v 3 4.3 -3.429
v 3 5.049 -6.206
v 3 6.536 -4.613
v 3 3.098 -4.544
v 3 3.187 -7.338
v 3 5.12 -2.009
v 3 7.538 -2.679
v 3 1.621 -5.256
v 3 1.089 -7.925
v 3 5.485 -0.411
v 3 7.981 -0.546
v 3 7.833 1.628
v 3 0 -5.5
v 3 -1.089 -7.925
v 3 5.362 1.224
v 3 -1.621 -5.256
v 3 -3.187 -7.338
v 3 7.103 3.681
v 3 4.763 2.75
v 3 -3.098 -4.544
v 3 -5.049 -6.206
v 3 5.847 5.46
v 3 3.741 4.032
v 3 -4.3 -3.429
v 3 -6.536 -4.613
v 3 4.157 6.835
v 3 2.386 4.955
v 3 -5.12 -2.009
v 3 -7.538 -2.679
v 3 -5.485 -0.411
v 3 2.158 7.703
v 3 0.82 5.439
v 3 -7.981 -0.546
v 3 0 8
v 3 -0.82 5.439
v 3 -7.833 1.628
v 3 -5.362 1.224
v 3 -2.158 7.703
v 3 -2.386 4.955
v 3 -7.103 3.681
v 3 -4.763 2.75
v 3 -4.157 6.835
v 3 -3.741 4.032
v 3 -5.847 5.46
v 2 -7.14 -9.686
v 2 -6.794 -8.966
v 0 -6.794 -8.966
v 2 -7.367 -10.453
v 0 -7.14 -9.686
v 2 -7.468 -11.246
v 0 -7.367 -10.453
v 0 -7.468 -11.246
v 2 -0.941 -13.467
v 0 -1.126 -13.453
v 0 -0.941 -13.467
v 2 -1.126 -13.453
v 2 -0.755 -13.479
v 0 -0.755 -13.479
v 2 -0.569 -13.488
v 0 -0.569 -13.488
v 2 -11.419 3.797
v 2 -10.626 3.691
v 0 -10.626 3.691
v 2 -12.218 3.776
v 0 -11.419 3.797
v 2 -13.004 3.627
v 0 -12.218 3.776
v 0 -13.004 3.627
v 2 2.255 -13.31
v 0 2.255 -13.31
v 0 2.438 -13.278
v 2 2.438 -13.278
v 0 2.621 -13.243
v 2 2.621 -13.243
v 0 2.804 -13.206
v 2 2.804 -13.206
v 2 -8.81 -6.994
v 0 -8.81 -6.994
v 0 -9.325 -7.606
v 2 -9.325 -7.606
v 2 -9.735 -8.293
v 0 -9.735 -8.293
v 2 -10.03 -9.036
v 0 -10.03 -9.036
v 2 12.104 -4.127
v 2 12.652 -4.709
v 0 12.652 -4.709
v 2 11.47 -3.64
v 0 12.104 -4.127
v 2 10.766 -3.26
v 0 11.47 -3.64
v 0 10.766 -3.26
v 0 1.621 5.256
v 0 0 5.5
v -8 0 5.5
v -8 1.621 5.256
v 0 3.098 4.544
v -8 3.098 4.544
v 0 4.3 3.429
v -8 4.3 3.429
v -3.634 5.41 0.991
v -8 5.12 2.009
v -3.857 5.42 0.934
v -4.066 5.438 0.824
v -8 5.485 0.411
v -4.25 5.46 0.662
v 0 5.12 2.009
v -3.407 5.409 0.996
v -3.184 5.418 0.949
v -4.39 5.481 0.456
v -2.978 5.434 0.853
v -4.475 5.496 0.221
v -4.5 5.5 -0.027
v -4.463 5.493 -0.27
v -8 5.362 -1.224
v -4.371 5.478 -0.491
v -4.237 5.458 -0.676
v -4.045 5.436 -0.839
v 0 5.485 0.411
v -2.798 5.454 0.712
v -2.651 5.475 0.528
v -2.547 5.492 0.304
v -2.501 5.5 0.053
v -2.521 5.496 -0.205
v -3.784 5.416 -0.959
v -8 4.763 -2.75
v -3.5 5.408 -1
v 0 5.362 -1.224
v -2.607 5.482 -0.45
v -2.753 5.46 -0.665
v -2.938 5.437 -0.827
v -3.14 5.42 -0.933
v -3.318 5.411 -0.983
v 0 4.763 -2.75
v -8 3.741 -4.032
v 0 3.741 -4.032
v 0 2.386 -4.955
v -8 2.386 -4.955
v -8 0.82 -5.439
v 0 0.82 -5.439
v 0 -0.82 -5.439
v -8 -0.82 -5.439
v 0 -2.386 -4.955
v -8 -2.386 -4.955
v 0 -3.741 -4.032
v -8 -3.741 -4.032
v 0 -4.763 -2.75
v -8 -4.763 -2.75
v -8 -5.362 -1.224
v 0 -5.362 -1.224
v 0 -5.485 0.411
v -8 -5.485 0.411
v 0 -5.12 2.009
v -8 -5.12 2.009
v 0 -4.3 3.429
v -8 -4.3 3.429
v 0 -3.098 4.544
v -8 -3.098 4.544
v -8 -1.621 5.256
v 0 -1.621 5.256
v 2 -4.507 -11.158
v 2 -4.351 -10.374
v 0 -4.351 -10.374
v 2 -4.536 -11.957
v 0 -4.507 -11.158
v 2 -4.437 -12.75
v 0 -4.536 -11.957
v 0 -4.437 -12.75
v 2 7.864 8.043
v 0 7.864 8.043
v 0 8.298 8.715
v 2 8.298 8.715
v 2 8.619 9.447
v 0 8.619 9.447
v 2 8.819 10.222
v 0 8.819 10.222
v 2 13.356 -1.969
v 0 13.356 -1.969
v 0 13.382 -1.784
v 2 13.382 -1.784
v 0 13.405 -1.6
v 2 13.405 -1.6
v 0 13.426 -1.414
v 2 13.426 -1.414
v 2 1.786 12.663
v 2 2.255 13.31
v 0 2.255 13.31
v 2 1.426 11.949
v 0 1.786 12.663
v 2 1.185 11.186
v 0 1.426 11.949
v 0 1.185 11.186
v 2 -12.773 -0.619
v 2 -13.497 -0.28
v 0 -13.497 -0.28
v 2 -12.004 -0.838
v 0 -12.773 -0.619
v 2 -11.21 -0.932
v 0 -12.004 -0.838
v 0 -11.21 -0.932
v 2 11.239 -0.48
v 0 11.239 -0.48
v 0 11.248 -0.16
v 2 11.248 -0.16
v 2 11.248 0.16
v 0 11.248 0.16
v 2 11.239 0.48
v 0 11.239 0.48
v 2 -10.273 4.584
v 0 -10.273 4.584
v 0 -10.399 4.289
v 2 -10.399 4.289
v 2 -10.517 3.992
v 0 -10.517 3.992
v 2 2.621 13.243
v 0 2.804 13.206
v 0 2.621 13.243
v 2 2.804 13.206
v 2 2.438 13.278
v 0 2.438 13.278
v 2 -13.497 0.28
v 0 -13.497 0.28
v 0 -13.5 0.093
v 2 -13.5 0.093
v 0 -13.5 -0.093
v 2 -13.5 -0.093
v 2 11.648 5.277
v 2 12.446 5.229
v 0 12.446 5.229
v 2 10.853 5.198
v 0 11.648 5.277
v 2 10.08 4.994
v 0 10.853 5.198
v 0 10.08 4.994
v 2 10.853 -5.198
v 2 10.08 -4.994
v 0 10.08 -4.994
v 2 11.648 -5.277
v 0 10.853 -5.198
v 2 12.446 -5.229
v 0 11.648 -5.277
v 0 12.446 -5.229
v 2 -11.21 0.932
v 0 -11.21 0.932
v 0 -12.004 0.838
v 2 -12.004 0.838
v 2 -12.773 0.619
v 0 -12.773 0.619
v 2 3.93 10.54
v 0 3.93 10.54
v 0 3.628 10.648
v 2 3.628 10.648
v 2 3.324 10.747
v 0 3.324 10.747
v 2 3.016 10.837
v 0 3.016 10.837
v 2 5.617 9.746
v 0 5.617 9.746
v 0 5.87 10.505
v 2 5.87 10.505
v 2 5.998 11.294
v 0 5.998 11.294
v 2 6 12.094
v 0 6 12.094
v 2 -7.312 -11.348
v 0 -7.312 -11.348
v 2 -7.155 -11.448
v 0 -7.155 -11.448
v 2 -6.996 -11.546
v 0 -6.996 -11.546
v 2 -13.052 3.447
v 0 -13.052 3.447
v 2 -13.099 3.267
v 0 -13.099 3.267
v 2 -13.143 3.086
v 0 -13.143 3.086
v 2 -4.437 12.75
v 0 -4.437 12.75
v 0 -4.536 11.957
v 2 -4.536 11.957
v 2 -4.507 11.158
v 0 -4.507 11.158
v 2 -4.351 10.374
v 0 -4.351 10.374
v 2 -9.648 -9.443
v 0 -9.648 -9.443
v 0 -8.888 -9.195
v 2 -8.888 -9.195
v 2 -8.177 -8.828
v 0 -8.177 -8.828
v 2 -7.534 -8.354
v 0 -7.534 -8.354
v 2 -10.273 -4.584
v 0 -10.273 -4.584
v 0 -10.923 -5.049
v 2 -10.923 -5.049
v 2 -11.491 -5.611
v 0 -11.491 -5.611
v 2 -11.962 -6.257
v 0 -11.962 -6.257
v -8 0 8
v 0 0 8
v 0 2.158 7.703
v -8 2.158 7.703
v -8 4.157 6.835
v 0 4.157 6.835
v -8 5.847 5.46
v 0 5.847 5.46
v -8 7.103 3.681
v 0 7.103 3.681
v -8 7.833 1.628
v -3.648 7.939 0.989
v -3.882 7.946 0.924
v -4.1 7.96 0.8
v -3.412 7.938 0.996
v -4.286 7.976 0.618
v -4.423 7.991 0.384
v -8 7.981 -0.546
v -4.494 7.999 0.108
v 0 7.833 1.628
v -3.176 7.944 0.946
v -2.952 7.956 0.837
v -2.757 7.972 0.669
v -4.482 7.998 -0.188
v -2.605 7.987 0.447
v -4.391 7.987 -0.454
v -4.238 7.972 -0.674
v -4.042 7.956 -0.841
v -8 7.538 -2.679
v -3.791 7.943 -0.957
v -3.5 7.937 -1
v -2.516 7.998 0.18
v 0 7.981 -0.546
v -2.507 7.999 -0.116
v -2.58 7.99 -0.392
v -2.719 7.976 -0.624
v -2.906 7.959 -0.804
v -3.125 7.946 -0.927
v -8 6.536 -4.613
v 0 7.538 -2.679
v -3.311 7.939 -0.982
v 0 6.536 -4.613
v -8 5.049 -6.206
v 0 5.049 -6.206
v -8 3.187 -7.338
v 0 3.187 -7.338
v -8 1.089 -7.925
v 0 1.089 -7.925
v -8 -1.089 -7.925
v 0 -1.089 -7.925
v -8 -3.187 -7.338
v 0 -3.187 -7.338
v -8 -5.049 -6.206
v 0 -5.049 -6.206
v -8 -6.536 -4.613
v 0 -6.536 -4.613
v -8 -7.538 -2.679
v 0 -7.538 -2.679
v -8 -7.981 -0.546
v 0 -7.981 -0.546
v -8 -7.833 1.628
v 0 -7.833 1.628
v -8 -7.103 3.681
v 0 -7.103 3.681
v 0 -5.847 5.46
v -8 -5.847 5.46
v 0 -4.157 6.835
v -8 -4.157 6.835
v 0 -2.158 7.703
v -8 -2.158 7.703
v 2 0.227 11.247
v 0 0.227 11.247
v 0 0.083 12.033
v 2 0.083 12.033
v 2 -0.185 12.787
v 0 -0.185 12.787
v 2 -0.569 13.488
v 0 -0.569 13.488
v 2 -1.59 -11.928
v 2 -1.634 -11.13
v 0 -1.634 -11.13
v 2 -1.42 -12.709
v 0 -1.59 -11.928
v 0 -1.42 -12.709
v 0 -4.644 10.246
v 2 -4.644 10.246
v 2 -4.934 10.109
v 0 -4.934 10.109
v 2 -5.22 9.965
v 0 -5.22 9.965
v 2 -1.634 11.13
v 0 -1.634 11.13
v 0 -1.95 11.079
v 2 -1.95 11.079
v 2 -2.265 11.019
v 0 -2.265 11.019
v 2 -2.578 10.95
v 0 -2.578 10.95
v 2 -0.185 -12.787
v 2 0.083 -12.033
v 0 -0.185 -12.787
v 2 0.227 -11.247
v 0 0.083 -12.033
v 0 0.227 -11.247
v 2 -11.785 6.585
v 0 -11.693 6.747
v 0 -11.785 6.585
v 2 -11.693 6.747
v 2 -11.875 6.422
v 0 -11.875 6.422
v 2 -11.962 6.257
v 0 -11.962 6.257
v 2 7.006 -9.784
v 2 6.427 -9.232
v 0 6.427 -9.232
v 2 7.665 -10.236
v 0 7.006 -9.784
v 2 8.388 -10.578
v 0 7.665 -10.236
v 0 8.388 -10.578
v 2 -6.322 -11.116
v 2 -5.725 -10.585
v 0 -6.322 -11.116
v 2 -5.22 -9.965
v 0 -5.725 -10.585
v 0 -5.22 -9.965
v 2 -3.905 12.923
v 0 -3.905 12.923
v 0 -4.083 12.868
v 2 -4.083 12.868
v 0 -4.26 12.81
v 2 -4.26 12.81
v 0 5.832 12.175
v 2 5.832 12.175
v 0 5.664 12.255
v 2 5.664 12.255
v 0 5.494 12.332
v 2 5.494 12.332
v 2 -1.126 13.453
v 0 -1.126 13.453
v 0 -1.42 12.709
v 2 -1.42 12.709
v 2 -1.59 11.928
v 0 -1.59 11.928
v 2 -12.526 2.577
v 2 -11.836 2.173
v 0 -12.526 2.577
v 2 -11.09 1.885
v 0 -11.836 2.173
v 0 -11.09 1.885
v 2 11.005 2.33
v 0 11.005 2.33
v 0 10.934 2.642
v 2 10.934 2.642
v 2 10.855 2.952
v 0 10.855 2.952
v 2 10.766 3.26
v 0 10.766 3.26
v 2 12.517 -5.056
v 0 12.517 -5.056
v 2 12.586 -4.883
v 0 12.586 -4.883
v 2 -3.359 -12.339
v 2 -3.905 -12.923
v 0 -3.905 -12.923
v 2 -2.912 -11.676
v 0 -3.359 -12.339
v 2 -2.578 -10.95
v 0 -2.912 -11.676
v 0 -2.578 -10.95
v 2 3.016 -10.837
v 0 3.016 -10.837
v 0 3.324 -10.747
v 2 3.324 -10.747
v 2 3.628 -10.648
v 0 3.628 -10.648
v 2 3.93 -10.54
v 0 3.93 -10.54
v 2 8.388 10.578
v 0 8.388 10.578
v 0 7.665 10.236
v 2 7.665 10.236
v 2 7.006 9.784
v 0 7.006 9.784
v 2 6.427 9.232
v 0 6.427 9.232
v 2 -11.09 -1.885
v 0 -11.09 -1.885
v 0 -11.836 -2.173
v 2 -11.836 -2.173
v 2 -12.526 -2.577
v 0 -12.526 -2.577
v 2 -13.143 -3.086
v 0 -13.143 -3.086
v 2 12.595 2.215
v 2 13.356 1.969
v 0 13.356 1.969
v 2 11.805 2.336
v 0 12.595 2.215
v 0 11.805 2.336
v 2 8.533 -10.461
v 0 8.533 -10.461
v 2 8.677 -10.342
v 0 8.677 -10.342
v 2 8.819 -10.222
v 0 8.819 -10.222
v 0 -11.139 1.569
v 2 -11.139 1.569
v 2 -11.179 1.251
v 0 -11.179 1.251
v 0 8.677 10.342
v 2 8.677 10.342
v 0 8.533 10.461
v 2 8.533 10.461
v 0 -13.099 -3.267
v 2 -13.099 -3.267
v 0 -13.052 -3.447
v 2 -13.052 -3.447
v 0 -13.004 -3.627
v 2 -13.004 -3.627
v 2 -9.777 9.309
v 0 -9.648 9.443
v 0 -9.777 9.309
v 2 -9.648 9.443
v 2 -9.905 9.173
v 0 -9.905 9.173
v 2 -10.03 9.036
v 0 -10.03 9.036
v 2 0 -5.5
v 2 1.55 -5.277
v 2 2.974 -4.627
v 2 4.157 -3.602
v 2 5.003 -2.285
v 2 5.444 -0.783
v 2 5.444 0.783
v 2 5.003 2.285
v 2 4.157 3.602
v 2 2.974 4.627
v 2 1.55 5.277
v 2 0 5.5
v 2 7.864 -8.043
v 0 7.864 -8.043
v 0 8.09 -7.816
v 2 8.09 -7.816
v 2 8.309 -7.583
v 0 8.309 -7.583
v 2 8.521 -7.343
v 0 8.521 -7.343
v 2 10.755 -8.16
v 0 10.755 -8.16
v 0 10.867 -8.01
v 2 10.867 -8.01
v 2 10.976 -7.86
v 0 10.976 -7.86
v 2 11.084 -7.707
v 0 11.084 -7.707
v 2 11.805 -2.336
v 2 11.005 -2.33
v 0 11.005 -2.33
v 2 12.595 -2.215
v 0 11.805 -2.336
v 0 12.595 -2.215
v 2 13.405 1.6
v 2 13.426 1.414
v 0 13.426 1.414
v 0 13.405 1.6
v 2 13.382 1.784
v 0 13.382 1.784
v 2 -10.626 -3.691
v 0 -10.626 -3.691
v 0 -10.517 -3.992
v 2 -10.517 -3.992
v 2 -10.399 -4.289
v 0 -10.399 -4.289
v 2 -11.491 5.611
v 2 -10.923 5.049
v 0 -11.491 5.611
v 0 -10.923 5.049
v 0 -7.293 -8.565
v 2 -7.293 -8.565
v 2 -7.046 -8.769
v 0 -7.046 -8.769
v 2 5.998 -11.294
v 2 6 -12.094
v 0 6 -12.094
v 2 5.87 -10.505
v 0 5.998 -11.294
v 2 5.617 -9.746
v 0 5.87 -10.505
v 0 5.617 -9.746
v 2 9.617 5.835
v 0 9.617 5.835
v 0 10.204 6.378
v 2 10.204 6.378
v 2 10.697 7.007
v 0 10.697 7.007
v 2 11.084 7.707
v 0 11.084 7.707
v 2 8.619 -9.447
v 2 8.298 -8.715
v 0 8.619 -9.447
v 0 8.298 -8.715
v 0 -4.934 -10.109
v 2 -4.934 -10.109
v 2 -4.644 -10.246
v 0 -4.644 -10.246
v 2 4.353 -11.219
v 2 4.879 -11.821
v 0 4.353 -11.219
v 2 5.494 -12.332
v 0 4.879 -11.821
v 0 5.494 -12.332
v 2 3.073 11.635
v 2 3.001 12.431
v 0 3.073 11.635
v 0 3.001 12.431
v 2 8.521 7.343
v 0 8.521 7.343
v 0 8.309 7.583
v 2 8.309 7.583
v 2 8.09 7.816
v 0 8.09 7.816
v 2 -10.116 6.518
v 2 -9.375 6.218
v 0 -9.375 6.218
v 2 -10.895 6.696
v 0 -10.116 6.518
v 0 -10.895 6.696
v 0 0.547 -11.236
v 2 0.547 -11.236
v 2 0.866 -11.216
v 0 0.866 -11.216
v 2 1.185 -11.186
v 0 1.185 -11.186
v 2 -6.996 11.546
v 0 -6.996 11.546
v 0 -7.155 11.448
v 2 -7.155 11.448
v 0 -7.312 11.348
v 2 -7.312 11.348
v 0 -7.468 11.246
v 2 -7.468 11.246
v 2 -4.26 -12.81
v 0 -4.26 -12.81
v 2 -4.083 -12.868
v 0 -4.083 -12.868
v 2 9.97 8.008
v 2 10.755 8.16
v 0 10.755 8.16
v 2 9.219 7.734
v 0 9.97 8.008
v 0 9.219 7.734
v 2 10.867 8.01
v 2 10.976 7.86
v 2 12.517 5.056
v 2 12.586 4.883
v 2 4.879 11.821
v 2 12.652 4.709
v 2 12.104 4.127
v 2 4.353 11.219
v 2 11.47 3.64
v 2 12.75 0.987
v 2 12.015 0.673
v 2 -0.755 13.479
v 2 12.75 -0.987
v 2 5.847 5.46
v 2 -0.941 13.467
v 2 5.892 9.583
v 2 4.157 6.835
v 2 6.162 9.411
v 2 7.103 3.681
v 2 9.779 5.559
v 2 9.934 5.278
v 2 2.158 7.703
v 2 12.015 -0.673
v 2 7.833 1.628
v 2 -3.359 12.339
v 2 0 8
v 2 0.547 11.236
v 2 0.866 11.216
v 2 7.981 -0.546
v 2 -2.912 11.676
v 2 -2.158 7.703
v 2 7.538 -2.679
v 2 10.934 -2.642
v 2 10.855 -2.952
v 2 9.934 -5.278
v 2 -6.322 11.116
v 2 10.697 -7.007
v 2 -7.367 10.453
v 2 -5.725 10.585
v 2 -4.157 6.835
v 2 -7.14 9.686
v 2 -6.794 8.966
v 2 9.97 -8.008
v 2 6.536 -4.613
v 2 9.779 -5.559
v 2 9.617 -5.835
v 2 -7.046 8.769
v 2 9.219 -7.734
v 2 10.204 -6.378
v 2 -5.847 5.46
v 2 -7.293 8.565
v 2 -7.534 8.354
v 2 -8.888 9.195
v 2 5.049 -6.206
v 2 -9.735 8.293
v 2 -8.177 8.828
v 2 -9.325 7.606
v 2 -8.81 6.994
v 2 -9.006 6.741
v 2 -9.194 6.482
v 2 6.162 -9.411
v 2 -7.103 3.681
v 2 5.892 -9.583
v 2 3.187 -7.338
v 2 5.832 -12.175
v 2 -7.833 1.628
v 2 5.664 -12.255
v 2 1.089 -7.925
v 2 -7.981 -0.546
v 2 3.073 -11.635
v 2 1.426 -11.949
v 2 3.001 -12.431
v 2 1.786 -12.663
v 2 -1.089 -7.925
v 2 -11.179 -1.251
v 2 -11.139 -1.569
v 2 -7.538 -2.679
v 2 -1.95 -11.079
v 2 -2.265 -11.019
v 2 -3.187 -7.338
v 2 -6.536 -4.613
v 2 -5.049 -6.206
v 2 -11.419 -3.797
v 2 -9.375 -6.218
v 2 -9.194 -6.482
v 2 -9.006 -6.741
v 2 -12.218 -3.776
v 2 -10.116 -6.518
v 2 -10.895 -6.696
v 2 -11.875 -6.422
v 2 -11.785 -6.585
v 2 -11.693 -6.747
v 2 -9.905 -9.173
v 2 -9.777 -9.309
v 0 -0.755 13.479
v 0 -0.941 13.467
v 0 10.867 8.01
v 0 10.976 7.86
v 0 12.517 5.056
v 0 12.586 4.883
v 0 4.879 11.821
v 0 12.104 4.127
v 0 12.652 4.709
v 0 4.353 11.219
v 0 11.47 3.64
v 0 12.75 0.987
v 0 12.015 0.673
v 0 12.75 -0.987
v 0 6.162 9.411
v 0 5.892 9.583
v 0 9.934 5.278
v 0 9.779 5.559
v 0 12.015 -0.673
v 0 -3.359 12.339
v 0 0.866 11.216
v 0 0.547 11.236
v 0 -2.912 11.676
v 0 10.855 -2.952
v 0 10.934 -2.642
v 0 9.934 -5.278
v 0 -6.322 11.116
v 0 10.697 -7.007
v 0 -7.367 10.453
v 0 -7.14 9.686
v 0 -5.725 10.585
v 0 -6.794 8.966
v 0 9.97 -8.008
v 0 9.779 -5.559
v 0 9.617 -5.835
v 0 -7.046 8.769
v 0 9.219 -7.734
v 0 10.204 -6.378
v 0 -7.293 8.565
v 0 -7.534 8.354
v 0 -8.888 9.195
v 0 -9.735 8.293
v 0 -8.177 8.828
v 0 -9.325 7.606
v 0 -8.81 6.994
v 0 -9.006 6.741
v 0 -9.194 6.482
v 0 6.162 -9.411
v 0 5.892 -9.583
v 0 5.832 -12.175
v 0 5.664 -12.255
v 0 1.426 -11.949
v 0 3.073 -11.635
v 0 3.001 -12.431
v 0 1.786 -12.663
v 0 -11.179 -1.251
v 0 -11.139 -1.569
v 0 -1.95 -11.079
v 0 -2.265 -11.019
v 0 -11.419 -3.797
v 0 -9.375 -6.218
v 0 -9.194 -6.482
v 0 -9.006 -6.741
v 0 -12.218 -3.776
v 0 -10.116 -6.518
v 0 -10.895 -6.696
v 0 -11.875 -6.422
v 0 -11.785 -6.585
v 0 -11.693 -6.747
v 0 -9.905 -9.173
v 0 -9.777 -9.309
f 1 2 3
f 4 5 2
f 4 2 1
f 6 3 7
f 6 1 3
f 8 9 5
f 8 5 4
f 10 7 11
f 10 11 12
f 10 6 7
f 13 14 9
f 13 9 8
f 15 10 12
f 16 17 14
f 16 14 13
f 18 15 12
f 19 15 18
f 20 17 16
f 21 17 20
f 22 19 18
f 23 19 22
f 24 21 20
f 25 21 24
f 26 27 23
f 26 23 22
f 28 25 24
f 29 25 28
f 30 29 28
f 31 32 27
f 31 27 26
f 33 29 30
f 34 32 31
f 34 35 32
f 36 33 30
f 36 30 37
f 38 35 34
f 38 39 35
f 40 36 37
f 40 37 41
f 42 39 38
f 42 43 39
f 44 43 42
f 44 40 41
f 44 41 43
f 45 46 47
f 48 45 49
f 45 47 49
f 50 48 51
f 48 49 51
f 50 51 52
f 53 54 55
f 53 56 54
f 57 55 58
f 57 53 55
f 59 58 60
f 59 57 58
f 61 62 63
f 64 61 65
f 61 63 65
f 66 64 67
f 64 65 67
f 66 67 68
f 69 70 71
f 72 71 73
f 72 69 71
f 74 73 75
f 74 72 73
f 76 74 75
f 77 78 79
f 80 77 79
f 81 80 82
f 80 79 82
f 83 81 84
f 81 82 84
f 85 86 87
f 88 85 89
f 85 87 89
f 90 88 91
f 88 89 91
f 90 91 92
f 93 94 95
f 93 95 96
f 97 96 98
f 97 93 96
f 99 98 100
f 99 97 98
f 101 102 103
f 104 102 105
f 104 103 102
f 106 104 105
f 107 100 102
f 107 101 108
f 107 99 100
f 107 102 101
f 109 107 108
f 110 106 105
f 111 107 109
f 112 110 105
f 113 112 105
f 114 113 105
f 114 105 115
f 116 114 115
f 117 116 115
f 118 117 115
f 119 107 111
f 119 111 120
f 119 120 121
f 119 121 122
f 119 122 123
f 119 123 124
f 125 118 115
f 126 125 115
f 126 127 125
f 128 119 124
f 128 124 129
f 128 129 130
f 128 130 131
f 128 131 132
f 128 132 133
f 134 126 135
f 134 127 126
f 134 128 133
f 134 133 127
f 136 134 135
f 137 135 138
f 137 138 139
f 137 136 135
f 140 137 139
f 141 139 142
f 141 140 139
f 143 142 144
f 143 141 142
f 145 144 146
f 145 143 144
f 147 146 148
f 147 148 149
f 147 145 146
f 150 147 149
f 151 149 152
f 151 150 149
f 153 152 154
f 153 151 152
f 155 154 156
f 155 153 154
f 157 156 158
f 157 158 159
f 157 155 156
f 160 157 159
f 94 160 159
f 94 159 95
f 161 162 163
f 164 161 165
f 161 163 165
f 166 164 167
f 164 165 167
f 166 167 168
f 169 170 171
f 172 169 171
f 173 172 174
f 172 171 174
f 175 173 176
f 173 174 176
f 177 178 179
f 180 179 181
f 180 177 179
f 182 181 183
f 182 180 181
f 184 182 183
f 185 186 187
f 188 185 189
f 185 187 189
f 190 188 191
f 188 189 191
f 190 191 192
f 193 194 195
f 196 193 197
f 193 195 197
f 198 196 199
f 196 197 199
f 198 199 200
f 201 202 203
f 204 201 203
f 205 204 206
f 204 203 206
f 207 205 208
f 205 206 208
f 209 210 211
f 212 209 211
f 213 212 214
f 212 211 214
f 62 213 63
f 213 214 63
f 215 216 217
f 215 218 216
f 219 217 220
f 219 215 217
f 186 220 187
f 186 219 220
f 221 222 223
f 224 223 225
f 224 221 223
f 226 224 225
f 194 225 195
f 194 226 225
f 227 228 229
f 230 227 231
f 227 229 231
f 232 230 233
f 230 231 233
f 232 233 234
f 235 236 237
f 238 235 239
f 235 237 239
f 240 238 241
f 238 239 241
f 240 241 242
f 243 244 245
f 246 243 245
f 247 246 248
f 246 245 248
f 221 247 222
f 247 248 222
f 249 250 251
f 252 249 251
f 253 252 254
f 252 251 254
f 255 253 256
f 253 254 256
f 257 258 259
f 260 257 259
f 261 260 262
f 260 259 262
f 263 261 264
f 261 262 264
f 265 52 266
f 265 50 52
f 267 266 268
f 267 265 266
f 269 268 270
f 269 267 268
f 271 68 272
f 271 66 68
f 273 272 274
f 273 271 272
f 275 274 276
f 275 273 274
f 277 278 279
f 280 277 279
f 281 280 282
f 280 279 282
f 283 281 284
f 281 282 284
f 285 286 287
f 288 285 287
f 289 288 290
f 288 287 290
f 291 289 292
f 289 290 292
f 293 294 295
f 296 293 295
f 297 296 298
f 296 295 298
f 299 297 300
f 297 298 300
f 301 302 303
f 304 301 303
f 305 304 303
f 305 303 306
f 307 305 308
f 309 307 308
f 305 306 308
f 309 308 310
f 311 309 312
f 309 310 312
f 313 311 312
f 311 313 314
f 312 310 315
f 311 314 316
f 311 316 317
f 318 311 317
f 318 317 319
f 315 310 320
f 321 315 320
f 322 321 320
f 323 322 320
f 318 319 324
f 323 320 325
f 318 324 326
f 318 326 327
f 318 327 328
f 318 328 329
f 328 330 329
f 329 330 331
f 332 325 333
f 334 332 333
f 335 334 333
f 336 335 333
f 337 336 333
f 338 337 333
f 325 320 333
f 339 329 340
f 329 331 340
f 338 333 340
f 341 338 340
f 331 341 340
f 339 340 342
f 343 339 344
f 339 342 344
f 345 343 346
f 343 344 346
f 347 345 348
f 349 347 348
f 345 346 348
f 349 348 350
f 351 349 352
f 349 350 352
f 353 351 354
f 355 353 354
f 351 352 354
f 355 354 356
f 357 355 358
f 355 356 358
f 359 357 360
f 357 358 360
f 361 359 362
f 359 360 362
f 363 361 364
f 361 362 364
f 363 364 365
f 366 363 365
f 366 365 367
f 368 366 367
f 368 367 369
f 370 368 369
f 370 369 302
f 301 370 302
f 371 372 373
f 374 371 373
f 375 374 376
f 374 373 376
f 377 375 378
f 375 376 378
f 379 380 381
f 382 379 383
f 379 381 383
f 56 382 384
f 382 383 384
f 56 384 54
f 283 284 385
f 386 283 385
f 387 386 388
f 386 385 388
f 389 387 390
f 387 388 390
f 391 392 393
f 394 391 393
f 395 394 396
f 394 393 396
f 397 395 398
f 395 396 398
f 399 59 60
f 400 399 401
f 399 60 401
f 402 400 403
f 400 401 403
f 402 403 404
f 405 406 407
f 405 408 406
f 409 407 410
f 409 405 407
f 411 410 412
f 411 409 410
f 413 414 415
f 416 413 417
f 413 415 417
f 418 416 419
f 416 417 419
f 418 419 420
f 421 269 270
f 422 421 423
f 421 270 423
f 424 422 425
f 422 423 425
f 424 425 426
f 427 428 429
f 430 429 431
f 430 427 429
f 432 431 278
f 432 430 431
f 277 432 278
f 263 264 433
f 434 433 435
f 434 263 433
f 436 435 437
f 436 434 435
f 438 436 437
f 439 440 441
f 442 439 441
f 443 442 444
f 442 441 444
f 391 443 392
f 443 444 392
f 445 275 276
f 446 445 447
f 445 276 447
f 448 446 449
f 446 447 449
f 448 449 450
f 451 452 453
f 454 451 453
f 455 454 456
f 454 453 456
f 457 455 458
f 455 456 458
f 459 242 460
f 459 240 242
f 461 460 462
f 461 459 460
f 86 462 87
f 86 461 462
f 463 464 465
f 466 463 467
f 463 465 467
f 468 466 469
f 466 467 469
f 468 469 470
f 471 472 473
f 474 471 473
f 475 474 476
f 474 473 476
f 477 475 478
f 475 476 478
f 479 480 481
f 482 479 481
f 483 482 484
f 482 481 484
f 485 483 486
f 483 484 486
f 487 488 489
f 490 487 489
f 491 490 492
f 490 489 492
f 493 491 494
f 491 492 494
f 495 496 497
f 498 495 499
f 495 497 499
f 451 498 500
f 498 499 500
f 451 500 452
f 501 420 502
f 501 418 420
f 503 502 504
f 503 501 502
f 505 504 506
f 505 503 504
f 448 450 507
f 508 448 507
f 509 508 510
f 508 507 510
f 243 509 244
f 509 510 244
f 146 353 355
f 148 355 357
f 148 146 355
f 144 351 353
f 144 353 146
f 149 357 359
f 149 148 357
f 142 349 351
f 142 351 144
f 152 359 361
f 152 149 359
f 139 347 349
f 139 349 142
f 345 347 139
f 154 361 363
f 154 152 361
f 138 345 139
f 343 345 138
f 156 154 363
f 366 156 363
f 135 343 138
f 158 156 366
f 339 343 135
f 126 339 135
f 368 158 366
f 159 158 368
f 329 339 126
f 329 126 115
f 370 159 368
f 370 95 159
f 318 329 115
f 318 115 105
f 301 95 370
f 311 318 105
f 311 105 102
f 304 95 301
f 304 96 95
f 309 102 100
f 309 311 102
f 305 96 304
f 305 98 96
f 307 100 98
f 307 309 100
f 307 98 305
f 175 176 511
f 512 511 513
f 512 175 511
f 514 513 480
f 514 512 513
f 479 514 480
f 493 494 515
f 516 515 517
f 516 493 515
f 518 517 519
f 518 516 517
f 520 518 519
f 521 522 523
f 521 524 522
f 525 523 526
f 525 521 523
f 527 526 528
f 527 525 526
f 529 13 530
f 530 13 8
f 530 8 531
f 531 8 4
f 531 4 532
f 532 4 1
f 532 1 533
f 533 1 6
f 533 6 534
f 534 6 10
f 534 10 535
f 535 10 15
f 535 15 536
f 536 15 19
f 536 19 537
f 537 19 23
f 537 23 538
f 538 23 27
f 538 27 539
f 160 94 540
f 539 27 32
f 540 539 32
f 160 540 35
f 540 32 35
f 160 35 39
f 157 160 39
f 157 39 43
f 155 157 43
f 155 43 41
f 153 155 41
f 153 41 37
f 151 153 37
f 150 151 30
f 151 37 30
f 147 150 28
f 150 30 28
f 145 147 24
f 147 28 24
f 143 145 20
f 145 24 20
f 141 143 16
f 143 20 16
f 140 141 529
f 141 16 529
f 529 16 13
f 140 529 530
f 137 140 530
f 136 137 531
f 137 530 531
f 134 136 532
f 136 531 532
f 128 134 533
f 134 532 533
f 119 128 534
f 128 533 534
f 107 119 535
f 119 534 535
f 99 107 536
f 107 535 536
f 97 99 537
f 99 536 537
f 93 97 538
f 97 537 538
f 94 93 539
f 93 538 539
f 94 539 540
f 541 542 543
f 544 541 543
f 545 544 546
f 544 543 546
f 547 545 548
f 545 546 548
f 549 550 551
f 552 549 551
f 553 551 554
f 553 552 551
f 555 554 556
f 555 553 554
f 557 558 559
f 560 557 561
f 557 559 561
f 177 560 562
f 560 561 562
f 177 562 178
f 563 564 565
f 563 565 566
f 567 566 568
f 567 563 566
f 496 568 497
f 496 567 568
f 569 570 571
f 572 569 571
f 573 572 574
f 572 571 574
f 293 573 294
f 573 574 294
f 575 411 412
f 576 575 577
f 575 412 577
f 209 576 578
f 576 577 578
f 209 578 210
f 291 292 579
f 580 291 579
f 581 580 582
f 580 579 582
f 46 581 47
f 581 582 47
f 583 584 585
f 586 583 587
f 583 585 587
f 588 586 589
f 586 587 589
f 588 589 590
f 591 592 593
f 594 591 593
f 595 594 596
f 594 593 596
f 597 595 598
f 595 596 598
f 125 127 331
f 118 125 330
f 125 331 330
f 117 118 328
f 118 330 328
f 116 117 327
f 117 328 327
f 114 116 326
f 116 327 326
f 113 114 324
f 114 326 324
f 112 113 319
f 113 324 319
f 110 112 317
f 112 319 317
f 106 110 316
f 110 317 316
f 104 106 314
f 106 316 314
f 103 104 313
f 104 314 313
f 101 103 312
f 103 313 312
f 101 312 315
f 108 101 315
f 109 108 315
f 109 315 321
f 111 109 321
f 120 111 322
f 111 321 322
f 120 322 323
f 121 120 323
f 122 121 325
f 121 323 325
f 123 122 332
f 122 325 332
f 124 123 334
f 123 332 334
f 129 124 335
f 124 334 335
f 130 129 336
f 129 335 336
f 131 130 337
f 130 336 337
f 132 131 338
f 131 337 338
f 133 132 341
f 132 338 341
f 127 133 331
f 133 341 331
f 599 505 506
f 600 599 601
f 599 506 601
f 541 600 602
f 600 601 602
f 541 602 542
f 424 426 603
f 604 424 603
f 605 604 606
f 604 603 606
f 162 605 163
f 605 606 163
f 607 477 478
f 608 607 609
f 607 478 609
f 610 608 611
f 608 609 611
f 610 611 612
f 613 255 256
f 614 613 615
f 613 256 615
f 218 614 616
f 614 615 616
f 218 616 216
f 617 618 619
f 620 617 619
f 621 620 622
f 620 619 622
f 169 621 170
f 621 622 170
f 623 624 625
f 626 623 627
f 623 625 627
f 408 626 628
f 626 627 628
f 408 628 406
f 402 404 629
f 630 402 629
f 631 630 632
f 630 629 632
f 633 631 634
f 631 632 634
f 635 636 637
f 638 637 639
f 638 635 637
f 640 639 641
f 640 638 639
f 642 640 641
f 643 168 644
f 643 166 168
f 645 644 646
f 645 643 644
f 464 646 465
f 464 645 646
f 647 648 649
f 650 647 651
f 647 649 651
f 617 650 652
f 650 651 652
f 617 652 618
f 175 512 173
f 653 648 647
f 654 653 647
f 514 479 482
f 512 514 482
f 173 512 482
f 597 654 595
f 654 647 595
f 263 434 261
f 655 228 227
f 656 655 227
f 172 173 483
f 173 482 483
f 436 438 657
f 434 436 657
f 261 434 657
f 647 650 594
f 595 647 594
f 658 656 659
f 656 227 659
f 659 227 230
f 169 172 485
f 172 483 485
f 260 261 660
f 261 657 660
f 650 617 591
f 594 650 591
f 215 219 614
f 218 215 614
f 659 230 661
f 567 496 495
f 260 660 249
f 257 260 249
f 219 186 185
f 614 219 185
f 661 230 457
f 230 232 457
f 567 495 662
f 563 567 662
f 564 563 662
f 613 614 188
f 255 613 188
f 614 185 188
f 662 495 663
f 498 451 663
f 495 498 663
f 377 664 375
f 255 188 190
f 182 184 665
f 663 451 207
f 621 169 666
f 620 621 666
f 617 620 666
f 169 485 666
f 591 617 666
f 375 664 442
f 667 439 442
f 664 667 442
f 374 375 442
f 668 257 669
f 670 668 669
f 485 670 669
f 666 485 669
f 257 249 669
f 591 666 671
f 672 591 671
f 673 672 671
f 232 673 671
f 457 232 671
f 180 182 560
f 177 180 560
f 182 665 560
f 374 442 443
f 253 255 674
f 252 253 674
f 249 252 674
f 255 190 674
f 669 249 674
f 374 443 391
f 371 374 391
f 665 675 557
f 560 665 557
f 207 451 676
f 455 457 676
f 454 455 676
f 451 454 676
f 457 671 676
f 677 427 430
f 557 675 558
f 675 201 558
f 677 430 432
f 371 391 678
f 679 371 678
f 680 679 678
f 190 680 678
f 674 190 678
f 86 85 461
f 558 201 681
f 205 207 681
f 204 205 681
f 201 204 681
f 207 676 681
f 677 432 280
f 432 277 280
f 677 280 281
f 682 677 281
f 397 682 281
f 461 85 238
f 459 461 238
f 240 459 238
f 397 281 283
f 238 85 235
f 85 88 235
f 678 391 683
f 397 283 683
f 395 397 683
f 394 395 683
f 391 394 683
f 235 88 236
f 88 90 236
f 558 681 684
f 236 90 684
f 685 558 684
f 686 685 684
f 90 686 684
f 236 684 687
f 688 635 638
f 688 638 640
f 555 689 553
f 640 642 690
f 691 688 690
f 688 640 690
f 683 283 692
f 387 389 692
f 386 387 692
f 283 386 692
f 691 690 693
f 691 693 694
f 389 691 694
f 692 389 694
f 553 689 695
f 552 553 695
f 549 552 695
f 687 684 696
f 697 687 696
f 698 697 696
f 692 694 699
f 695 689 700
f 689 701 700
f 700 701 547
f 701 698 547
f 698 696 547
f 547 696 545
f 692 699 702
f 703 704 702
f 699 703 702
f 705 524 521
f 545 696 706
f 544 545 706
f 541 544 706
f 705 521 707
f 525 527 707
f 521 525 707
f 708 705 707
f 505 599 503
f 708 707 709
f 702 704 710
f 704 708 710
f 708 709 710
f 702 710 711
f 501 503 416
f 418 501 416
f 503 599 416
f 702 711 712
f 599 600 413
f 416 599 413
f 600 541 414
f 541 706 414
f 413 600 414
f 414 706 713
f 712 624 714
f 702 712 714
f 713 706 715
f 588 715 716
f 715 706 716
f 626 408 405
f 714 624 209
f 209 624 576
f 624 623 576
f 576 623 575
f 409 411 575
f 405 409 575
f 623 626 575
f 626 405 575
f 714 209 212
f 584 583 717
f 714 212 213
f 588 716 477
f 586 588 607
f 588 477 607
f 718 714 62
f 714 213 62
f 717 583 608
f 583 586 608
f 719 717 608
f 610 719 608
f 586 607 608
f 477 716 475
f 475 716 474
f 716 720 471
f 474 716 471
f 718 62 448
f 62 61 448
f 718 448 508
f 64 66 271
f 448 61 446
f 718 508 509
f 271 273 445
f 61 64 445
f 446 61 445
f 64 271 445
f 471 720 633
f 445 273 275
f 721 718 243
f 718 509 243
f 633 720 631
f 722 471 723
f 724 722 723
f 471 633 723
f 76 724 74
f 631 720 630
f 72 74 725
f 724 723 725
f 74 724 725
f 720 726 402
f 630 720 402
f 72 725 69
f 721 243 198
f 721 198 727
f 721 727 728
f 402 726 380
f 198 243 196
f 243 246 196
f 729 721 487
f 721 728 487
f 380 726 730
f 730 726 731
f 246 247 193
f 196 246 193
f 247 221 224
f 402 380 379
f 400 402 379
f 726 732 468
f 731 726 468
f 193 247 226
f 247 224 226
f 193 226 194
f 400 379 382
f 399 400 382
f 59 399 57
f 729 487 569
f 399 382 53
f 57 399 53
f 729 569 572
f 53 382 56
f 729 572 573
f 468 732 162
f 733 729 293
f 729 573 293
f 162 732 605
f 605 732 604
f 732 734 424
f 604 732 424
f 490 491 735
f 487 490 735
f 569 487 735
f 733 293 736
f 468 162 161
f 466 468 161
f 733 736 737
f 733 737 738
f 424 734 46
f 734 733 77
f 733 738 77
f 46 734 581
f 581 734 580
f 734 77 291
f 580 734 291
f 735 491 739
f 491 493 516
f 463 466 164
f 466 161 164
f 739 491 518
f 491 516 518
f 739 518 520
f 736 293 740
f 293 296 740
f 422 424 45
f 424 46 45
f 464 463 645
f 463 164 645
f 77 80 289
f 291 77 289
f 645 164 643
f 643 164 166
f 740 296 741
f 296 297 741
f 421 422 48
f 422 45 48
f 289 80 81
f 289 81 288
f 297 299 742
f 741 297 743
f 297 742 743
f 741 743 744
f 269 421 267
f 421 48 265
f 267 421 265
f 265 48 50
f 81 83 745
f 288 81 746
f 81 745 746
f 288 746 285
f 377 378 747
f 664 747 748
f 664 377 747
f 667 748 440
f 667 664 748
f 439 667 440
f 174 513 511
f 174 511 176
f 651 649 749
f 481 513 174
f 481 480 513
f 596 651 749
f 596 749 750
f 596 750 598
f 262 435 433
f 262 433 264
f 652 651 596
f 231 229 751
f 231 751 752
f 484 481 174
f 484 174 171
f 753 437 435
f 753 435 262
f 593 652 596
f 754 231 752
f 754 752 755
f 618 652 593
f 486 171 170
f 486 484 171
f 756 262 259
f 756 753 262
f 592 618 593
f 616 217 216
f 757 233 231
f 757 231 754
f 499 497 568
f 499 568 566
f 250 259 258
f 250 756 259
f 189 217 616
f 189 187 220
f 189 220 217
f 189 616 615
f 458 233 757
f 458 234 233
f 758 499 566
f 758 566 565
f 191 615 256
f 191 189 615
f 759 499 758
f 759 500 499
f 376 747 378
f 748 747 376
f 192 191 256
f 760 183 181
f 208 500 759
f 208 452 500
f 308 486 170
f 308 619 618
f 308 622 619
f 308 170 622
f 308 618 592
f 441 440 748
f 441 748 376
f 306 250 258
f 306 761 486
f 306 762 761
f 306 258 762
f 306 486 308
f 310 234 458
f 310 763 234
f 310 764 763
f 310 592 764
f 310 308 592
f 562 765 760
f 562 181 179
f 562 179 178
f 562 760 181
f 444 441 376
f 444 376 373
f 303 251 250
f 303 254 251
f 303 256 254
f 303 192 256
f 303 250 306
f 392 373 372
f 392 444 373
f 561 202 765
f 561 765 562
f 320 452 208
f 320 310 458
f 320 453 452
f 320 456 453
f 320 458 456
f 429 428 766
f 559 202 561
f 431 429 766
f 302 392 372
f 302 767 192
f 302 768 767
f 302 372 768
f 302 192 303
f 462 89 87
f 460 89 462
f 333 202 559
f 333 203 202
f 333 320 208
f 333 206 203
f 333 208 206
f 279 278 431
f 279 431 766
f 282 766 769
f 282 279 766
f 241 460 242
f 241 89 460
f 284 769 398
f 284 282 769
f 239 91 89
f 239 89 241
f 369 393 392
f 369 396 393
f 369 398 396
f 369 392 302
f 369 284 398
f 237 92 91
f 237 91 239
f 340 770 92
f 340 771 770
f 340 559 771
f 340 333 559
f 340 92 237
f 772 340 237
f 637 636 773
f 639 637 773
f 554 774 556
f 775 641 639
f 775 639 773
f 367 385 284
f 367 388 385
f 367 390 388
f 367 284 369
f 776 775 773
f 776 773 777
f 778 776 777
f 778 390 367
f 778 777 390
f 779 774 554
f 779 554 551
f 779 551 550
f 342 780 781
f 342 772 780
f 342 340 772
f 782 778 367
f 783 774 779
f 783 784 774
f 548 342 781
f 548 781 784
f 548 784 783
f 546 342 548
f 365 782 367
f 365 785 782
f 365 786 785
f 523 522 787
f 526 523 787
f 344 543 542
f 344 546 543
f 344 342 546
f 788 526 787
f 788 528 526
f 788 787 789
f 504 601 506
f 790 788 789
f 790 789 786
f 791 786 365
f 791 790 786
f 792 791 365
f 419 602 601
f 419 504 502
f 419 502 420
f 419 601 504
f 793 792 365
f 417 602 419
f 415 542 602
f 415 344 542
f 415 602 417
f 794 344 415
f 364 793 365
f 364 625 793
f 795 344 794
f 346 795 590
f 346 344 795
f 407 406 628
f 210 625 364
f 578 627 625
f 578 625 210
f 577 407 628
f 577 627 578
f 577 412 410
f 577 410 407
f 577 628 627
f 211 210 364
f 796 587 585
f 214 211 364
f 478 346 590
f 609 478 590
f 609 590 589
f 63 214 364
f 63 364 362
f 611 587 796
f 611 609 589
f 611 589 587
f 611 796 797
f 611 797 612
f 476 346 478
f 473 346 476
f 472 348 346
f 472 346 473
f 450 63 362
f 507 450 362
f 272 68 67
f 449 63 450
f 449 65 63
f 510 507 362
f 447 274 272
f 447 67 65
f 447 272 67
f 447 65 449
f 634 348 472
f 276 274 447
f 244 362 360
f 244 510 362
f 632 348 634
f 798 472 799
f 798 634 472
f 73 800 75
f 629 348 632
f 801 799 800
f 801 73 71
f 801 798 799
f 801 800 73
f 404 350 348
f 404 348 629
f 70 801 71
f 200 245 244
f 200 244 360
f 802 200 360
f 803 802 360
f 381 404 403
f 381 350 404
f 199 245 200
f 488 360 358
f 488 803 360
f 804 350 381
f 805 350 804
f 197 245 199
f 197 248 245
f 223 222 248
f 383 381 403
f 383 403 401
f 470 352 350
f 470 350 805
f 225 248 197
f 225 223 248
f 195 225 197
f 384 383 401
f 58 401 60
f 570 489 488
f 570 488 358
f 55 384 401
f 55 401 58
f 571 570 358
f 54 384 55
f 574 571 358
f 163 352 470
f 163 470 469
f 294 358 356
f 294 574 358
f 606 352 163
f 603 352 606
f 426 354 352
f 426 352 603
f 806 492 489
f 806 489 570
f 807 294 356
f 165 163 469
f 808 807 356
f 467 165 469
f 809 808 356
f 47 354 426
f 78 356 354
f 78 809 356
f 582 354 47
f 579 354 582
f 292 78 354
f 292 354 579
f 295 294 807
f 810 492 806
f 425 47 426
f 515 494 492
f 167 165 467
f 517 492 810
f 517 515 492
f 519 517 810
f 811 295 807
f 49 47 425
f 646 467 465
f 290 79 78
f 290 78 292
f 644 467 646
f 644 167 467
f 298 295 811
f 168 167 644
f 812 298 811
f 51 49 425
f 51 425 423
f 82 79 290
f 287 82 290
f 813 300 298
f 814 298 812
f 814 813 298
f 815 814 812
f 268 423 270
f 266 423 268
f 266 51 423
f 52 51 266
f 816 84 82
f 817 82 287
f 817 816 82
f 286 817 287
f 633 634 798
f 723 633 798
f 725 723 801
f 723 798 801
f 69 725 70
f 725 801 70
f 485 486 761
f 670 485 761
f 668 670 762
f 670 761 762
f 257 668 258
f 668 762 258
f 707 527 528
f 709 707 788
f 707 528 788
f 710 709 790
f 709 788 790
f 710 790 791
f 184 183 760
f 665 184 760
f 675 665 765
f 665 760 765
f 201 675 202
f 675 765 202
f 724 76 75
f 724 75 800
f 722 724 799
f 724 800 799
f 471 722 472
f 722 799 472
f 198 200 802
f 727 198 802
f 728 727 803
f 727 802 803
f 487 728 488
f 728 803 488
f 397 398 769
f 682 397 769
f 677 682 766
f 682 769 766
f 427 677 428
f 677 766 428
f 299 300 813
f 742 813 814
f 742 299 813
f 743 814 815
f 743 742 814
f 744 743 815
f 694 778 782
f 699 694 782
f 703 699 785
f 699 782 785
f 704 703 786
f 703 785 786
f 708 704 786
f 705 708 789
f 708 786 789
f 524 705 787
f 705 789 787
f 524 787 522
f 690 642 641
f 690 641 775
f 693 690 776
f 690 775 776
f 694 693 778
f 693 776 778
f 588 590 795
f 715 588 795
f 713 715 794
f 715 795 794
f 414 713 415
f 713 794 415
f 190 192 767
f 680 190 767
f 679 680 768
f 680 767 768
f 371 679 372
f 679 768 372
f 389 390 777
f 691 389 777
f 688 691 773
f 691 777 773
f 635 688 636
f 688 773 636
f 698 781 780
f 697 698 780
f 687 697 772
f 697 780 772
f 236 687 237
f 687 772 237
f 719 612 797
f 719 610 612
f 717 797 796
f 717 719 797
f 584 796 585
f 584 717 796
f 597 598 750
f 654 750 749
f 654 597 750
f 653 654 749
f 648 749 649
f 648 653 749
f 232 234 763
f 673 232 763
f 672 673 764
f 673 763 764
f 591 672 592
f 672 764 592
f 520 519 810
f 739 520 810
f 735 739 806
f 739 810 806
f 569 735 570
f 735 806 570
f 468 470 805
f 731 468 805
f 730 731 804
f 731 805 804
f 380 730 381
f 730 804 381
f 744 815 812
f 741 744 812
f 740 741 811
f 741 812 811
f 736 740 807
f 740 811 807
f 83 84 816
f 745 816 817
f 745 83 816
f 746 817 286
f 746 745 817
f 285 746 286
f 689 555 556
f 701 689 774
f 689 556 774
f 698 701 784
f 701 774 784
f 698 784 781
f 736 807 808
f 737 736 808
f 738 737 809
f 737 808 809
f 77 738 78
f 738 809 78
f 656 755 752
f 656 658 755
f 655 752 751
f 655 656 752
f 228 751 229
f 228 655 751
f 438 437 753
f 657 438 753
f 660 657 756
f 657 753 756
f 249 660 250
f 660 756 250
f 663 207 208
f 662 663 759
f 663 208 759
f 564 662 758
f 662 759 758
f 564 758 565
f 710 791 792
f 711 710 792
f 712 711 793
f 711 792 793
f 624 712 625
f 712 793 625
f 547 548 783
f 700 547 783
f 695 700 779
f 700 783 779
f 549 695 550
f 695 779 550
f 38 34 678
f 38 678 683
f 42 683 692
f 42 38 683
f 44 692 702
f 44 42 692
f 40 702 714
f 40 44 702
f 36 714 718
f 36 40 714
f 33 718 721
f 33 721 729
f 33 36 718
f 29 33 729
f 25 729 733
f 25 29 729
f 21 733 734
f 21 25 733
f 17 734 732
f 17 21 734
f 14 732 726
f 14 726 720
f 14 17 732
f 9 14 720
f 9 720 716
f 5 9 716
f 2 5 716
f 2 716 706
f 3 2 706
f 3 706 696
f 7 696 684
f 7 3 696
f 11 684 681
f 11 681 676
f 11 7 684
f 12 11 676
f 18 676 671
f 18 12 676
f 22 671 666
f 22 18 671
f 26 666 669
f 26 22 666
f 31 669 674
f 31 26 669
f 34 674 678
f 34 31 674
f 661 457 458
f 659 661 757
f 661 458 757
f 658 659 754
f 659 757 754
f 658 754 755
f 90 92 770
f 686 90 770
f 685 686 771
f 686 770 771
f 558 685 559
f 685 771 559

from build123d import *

# Parameters (mm, degrees)
BASPROSKE_W        = 2
BASPROSKE_H        = 13.5
TOOTHCUT_DEPTH     = 20.19635382
TEETHCUTS_COUNT    = 25
TEETHCUTS_ANGLE    = 345.6
BORSKE_R           = 5.5
BORE_DEPTH         = 50.0000508
BOSS_EXTRU_1_START = 1
ESQUISSE1_R        = 8
ESQUISSE1_R_2      = 5.5
BOSS_EXTRU_1_DEPTH = 1
ESQUISSE2_R        = 8
ESQUISSE2_R_2      = 5.5
BOSS_EXTRU_2_DEPTH = 8
ESQUISSE4_W        = 1
ESQUISSE4_H        = 13.425711508


with BuildPart() as part:
    # BasProSke → Base-Revolve (revolve)
    with BuildSketch(Plane(origin=(0, 0, 0), x_dir=(1, 0, 0), z_dir=(0, 1, 0)), mode=Mode.PRIVATE) as base_revolve_sk:
        with Locations((1, 6.75)):
            Rectangle(BASPROSKE_W, BASPROSKE_H)
    revolve(base_revolve_sk.sketch.rotate(Axis((-10, 0, 0), (1, 0, 0)), 180), axis=Axis((-10, 0, 0), (1, 0, 0)))

    # TooCutSke → ToothCut (cut, through all)
    with BuildSketch(Plane(origin=(0, 0, 0), x_dir=(0, 0, -1), z_dir=(1, 0, 0))):
        with BuildLine():
            ThreePointArc((0.480087995, 11.238750665), (0, 11.249), (-0.480087995, 11.238750665))
            ThreePointArc((-0.480087995, 11.238750665), (-0.821124963, 12.40220054), (-1.432168974, 13.449361962))
            ThreePointArc((-1.432168974, 13.449361962), (0, 13.5254), (1.432168974, 13.449361962))
            ThreePointArc((1.432168974, 13.449361962), (0.821124963, 12.40220054), (0.480087995, 11.238750665))
        make_face()
    toothcut = extrude(amount=TOOTHCUT_DEPTH, mode=Mode.SUBTRACT)

    # TeethCuts: ToothCut ×25 about axis
    teethcuts_axis = Axis((-10, 0, 0), (1, 0, 0))
    for i in range(1, TEETHCUTS_COUNT):
        add(toothcut.rotate(teethcuts_axis, i * TEETHCUTS_ANGLE / (TEETHCUTS_COUNT - 1)), mode=Mode.SUBTRACT)

    # BorSke → Bore (cut, symmetric)
    with BuildSketch(Plane(origin=(0, 0, 0), x_dir=(0, 0, -1), z_dir=(1, 0, 0))):
        with Locations(Location((0, 0, 0), (0, 0, 180))):
            Circle(BORSKE_R)
    extrude(amount=BORE_DEPTH, both=True, mode=Mode.SUBTRACT)

    # Esquisse1 → Boss.-Extru.1 (add)
    with BuildSketch(Plane(origin=(2, 0, 0), x_dir=(0, 0, -1), z_dir=(1, 0, 0)).offset(BOSS_EXTRU_1_START)):
        with Locations(Location((0, 0, 0), (0, 0, 180))):
            Circle(ESQUISSE1_R)
        Circle(ESQUISSE1_R_2, mode=Mode.SUBTRACT)
    extrude(amount=-BOSS_EXTRU_1_DEPTH)

    # Esquisse2 → Boss.-Extru.2 (add)
    with BuildSketch(Plane.ZY):
        Circle(ESQUISSE2_R)
        Circle(ESQUISSE2_R_2, mode=Mode.SUBTRACT)
    extrude(amount=BOSS_EXTRU_2_DEPTH)

    # Esquisse4 → Diamètre du perçage Ø2.0 (2)1 (revolve, cut)
    with BuildSketch(Plane(origin=(-3.5, 0, 0), x_dir=(0, 0, -1), z_dir=(1, 0, 0))):
        with Locations((0.5, 6.712855754)):
            Rectangle(ESQUISSE4_W, ESQUISSE4_H)
    revolve(axis=Axis((-3.5, -6.35, 0), (0, 1, 0)), mode=Mode.SUBTRACT)


solid = part.part
